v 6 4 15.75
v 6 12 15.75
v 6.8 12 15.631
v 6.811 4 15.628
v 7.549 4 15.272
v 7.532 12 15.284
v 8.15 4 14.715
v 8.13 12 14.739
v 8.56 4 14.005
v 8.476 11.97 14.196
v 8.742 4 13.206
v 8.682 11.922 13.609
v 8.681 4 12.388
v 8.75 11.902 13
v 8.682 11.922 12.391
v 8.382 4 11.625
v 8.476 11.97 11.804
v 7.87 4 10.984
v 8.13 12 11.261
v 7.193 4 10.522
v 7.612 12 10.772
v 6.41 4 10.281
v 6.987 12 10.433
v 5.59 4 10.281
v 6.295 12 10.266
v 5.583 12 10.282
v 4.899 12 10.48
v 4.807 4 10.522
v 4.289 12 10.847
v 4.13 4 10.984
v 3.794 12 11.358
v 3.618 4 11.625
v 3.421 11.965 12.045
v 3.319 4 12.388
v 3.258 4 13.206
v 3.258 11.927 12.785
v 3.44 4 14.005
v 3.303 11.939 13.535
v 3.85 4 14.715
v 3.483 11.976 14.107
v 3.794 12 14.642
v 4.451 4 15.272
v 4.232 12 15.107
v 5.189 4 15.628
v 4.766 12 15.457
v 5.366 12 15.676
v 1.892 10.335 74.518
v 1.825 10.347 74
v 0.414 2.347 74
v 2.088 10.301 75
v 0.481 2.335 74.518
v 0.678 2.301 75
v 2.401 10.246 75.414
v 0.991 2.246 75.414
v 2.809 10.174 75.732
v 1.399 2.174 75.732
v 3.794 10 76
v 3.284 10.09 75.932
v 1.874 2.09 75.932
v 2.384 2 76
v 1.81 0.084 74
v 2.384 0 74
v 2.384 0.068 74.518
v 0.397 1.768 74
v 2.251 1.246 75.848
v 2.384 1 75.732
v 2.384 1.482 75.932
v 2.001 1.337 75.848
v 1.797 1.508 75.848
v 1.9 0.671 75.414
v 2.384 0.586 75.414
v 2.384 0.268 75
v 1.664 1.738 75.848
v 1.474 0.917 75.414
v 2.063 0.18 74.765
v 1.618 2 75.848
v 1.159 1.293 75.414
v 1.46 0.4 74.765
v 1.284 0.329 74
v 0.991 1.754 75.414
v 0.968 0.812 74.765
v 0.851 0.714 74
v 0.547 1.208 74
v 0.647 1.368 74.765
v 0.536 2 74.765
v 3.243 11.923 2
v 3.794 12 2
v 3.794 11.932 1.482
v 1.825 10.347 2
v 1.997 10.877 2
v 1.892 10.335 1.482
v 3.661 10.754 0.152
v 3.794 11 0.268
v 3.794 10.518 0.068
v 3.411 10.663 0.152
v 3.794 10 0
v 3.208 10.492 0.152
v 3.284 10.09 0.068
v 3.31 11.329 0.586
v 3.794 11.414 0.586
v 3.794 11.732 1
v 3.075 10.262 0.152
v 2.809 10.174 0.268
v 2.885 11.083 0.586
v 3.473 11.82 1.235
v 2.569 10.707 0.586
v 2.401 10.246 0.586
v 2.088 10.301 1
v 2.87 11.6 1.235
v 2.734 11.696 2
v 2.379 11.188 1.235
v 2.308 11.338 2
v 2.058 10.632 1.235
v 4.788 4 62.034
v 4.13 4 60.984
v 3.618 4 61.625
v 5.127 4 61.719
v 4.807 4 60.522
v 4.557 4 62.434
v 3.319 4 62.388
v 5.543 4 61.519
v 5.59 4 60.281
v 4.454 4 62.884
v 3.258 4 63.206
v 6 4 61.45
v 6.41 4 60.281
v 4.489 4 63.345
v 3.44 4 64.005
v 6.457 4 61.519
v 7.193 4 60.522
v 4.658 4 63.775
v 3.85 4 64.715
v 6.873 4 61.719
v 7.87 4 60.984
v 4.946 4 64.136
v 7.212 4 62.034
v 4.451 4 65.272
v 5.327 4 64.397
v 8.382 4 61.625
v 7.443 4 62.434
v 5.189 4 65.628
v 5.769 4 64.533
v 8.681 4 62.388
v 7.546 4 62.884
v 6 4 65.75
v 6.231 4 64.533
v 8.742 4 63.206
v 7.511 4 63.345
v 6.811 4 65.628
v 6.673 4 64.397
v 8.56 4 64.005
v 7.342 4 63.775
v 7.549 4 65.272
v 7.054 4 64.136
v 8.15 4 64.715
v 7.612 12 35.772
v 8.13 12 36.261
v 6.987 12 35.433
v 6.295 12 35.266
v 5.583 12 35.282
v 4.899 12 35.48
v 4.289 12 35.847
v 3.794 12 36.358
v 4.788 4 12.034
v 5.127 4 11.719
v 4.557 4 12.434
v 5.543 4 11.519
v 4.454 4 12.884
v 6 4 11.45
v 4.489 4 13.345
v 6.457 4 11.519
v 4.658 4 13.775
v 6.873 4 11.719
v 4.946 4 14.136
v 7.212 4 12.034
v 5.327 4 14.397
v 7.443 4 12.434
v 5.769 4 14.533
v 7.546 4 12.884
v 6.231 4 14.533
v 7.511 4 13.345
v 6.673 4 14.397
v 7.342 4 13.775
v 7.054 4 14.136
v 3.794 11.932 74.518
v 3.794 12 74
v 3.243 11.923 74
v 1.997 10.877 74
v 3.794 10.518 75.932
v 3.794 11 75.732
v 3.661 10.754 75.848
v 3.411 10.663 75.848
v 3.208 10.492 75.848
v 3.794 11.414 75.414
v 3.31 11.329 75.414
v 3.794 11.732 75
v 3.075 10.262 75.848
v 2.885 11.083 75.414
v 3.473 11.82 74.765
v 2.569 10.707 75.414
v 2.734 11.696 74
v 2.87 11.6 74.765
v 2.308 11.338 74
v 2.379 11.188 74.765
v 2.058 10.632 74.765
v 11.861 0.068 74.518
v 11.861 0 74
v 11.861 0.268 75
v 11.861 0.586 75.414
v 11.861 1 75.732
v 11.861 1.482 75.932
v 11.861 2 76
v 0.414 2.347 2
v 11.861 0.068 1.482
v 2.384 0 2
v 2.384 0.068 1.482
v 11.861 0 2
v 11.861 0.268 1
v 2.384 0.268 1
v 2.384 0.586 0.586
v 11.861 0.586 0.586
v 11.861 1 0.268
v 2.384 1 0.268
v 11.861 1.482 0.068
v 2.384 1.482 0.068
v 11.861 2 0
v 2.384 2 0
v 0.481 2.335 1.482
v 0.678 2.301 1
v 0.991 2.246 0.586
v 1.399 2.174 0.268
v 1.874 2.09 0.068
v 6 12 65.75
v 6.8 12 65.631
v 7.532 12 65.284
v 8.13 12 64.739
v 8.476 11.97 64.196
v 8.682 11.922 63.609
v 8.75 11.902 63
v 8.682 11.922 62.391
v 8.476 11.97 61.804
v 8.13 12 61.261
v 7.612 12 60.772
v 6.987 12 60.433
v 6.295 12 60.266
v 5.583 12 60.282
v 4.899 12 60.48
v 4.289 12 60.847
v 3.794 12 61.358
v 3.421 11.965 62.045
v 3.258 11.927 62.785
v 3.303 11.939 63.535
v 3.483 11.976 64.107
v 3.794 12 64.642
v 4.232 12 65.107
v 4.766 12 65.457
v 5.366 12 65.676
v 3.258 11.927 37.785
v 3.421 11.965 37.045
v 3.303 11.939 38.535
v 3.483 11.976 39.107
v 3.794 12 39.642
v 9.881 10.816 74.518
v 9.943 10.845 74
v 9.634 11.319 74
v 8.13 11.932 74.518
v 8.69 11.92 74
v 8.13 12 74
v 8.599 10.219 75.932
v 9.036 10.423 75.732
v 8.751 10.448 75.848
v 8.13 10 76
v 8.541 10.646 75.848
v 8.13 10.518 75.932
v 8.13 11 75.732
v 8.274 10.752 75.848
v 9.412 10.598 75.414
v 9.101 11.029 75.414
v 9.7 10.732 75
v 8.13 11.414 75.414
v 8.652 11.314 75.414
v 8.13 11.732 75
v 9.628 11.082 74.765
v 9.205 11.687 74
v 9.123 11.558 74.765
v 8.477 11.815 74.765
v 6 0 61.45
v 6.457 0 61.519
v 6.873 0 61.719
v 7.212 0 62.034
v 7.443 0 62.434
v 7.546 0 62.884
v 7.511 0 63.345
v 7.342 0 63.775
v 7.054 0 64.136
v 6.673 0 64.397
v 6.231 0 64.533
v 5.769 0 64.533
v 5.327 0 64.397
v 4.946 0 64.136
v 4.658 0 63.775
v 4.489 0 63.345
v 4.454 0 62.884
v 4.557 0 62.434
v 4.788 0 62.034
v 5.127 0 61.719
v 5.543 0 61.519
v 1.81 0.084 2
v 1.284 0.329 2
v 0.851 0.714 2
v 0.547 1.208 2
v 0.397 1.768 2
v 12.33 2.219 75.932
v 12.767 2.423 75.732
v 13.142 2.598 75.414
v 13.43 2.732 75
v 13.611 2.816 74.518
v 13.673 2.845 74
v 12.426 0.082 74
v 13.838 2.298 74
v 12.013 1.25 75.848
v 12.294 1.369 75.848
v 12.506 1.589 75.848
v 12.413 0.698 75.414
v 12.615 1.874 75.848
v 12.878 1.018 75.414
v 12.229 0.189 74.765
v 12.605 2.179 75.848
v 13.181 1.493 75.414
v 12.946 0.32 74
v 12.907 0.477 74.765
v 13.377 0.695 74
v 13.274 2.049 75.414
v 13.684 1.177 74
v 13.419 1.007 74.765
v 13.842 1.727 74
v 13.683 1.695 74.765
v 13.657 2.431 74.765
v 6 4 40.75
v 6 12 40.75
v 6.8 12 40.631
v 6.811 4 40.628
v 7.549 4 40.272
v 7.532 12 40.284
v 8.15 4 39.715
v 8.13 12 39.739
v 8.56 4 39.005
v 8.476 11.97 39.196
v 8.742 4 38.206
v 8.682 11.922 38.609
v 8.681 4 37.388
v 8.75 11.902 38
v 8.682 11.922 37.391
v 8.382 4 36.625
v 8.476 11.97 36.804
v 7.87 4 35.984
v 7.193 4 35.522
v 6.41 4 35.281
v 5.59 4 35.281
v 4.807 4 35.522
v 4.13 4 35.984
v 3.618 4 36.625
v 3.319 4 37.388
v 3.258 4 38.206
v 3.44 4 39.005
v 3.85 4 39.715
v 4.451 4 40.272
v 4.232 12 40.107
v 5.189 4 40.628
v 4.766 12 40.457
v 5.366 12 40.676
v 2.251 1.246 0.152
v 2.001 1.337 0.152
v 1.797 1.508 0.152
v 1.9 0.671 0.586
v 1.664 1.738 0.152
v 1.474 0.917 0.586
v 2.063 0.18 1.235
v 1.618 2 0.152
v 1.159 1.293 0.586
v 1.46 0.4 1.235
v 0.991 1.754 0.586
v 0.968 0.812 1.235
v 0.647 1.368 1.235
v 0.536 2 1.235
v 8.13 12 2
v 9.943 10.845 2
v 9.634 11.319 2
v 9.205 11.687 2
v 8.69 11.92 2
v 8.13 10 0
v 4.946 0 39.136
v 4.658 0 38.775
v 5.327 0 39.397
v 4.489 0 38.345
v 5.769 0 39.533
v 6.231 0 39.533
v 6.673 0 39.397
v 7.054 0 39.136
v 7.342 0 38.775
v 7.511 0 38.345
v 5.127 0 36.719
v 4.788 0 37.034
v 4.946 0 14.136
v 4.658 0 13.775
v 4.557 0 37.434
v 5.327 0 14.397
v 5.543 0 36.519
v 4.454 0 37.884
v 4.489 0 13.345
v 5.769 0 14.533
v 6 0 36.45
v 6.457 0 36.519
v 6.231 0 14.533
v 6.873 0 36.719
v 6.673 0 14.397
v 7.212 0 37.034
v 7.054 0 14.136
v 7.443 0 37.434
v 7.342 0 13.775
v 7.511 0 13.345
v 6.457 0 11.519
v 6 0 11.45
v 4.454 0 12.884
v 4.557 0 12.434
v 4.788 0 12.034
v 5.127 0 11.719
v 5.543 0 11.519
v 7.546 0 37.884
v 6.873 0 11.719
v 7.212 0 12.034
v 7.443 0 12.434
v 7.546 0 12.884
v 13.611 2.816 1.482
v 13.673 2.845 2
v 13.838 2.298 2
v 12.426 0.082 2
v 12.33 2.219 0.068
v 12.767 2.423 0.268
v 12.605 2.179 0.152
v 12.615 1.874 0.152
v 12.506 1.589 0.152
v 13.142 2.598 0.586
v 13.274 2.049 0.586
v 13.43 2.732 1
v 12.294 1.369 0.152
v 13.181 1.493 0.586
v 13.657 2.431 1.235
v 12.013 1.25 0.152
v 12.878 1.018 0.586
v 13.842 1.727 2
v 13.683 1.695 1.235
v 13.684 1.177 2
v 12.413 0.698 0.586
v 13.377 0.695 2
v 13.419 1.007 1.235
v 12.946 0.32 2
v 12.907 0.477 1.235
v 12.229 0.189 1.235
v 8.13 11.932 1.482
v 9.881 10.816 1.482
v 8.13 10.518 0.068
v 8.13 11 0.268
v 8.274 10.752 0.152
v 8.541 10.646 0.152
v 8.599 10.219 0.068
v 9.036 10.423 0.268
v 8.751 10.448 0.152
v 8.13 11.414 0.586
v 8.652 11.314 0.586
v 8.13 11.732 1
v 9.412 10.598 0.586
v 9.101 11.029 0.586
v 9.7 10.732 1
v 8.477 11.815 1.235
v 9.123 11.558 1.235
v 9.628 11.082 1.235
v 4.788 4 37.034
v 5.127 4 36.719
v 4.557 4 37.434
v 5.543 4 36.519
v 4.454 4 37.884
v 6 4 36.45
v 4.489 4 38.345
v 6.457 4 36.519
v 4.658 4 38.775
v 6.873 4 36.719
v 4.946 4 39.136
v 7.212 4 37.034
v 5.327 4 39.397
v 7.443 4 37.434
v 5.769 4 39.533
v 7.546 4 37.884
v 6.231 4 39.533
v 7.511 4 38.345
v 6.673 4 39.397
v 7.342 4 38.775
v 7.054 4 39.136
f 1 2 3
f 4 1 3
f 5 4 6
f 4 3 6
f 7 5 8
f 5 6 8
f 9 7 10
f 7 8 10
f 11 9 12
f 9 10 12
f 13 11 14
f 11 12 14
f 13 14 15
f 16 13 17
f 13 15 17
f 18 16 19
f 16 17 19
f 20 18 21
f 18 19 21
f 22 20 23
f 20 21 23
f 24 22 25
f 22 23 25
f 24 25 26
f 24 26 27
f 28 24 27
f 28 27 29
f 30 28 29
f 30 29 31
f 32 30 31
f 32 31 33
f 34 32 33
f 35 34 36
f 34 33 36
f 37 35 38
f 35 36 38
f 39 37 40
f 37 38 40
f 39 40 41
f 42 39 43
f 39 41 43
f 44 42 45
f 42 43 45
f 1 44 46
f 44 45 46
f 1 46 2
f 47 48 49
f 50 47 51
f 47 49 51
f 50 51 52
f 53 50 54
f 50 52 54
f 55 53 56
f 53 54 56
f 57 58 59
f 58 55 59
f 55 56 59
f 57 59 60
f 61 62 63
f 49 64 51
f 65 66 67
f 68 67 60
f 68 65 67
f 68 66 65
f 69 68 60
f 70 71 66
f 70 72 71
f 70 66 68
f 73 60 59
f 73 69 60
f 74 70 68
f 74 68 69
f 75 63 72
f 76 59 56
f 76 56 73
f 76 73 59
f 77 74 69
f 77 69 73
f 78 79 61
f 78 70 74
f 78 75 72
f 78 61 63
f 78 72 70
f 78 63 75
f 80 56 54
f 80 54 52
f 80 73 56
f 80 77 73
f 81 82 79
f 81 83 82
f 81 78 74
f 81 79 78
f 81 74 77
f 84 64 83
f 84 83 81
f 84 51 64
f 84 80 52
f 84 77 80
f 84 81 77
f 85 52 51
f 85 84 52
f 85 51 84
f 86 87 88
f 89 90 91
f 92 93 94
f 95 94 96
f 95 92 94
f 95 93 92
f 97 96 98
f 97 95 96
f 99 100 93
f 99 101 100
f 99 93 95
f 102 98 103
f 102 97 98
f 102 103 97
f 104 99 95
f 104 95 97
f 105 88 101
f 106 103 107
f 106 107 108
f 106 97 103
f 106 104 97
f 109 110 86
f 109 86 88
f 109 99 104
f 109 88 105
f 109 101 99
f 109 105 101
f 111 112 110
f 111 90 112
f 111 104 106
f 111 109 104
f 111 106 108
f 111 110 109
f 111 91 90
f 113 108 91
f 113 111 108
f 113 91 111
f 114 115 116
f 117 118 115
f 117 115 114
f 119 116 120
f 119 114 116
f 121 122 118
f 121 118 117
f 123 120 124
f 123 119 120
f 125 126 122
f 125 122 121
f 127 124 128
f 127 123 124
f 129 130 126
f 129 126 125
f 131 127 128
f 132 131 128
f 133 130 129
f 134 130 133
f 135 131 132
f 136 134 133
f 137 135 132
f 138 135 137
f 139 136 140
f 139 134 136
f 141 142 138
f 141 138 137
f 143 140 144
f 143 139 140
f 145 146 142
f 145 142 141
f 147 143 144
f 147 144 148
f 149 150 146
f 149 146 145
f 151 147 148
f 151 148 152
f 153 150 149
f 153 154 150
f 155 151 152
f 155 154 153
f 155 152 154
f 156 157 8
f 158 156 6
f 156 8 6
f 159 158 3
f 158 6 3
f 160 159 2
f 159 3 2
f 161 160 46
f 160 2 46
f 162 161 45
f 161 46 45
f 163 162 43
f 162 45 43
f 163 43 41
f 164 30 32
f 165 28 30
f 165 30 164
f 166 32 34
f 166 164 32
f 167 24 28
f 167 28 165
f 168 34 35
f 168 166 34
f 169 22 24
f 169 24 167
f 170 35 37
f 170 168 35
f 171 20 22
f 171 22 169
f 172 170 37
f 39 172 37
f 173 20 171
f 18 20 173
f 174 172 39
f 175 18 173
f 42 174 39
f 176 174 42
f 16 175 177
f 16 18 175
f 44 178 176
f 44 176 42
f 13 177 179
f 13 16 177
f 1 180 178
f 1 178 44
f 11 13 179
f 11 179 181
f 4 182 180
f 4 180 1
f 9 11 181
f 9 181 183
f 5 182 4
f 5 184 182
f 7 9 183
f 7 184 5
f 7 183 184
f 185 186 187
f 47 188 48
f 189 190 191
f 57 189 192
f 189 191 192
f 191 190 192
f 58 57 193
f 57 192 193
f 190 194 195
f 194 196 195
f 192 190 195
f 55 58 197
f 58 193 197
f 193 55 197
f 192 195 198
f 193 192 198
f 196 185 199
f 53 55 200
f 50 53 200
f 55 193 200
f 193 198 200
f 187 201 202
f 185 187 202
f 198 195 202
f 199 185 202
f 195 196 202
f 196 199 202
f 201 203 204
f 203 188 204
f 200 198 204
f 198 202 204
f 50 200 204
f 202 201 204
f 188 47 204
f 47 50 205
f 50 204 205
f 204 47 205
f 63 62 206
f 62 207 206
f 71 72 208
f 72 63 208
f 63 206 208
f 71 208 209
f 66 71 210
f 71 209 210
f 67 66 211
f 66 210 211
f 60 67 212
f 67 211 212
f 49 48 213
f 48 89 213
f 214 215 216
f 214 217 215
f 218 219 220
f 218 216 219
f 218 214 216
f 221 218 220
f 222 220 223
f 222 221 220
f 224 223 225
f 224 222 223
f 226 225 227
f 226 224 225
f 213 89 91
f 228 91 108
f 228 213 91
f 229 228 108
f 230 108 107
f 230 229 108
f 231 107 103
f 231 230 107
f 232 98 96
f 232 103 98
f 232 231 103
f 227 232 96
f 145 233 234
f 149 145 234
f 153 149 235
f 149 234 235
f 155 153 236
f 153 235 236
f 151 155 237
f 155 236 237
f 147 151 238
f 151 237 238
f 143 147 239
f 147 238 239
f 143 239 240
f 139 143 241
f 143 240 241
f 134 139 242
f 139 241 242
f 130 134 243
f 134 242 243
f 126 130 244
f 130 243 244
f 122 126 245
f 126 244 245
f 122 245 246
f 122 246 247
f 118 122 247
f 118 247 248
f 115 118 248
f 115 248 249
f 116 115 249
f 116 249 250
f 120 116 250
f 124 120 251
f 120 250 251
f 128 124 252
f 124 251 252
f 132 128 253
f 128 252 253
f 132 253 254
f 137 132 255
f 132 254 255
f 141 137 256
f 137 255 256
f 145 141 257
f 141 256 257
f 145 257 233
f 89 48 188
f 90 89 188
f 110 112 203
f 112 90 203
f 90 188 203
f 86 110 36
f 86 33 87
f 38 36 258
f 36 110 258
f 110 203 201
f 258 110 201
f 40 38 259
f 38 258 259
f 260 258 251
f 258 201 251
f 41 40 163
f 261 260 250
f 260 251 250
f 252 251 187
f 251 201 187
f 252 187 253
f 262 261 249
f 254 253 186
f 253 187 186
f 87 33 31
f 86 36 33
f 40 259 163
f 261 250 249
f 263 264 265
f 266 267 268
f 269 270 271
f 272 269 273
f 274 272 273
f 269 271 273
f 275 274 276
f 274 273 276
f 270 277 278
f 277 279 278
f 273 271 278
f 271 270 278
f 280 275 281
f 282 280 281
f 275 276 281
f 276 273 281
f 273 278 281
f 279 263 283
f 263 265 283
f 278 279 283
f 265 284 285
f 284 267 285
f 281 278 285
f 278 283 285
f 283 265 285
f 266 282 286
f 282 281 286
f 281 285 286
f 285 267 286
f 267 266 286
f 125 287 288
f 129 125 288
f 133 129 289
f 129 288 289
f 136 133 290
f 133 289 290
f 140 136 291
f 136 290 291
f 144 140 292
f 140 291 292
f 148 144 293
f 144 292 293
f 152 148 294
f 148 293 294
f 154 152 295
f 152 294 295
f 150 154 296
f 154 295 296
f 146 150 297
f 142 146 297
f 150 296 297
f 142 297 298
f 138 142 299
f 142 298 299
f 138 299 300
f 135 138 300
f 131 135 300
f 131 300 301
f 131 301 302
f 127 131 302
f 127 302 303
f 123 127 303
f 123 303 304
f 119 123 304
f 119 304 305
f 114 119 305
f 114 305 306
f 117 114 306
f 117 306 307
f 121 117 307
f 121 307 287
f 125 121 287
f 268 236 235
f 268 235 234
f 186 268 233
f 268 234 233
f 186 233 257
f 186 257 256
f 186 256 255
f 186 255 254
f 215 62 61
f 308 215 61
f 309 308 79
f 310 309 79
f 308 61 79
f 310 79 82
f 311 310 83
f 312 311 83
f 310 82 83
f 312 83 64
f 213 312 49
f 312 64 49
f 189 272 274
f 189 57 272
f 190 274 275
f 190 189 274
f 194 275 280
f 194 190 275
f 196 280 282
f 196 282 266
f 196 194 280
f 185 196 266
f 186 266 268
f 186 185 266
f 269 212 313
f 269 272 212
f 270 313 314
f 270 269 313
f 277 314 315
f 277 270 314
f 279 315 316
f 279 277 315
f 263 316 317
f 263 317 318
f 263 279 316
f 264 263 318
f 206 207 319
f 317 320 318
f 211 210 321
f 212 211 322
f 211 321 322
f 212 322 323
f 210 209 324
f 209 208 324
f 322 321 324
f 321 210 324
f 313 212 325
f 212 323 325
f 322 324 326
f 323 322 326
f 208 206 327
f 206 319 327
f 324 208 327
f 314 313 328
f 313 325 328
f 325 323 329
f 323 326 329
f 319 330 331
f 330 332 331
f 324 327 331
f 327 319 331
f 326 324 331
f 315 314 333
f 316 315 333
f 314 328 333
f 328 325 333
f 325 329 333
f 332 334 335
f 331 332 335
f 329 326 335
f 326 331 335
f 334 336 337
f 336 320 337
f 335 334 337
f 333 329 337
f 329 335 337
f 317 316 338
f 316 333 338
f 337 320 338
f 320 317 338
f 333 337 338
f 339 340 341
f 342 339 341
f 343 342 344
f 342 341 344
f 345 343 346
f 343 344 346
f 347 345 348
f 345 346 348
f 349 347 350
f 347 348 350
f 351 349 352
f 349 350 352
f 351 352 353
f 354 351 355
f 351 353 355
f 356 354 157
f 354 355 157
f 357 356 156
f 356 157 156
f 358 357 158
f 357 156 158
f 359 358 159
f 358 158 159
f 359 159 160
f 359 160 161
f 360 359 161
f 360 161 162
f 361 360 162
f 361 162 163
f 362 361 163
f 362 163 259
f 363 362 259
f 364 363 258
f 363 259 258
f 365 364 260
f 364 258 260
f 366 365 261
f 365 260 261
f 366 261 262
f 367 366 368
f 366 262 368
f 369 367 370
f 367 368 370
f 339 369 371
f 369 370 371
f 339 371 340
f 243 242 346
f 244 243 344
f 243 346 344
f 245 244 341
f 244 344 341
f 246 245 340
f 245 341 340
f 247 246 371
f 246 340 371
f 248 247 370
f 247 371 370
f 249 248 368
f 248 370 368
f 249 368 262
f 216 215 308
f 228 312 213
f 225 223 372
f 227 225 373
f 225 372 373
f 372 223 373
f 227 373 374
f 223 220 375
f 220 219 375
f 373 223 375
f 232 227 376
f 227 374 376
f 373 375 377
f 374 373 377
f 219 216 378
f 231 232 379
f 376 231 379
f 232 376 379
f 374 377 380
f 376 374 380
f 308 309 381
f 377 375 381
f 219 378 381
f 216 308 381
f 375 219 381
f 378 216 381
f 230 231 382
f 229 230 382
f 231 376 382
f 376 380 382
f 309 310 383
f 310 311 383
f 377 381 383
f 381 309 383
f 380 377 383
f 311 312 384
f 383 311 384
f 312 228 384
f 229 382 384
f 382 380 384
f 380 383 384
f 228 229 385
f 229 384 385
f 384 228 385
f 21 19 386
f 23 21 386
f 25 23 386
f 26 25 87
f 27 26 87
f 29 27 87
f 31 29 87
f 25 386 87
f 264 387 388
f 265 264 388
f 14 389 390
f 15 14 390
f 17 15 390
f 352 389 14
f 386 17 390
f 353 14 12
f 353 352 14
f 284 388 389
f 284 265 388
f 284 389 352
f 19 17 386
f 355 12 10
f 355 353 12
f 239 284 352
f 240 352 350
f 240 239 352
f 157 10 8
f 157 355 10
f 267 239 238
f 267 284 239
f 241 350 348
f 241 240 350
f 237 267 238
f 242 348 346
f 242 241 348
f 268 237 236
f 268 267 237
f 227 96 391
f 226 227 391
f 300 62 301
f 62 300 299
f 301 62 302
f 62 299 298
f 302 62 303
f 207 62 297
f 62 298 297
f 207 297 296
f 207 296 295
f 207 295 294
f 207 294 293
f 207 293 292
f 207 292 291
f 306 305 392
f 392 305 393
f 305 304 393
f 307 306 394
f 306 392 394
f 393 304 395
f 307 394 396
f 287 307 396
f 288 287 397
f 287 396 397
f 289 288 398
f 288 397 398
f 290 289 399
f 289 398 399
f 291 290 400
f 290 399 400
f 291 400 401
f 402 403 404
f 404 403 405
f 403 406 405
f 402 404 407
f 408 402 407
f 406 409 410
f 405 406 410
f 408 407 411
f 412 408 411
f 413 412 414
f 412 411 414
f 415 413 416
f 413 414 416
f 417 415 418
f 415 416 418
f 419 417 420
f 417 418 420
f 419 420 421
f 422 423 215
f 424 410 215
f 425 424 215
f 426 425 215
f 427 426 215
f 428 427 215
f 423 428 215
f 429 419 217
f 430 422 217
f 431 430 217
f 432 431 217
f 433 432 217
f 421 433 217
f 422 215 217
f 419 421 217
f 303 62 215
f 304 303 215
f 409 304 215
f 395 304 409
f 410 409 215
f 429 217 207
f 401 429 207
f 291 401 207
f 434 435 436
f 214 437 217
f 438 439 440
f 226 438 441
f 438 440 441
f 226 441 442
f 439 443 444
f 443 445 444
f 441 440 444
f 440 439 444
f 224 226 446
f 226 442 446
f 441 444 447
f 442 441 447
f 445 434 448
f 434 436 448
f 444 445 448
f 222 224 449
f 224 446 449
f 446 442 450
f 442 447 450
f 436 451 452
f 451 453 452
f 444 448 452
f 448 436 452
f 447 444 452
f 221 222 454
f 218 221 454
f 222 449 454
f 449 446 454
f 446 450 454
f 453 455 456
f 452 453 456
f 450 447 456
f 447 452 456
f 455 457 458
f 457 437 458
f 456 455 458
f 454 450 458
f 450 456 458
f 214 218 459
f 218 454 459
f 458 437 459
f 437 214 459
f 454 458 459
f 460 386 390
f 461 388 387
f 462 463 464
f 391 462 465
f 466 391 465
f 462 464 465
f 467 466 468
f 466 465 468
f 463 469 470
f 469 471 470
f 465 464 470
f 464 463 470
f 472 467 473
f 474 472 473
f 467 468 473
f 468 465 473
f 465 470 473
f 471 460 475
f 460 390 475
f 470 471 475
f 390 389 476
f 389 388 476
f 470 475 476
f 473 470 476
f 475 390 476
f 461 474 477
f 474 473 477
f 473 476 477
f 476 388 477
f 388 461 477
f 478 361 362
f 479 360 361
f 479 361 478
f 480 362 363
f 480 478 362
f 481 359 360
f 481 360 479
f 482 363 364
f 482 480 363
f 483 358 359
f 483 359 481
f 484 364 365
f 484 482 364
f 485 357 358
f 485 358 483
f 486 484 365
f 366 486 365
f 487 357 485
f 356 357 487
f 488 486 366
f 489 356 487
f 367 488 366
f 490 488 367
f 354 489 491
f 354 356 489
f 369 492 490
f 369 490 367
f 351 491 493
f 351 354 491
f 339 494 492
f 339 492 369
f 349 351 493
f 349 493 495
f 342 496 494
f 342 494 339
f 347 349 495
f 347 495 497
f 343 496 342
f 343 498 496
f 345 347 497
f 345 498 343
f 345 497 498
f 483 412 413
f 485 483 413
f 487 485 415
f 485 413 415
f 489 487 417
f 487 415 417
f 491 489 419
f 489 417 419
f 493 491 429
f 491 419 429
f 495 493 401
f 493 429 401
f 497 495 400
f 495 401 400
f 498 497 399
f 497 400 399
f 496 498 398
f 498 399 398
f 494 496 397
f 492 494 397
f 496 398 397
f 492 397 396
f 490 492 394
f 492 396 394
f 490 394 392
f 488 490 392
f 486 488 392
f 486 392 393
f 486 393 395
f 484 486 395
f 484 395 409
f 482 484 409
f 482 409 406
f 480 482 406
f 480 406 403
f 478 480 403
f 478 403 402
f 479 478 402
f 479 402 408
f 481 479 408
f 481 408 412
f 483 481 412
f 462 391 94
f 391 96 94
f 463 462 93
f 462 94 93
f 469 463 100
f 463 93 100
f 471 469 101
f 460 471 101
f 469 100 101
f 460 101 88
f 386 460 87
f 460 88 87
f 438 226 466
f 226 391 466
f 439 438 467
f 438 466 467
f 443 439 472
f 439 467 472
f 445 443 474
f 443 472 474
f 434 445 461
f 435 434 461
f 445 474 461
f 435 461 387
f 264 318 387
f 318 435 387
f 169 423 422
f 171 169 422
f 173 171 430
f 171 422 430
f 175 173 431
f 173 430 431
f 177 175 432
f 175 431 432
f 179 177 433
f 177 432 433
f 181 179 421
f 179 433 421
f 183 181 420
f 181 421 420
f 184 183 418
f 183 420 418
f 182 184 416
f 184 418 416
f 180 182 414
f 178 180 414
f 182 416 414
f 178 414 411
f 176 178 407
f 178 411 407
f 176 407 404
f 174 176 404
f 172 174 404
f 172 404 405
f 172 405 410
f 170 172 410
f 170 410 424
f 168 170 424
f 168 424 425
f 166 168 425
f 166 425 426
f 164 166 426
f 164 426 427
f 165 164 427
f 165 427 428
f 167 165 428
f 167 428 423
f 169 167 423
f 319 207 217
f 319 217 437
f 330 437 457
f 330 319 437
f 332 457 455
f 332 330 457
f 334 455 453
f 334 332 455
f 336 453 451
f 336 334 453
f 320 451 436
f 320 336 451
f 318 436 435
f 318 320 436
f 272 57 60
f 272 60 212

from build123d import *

# Parameters (mm, degrees)
EXTRUDE_1_DEPTH     = 76
SKETCH_2_R          = 1.55
CUT_EXTRUDE_1_DEPTH = 79.390050389
FILLET_1_R          = 2
SKETCH_3_R          = 2.75
CUT_EXTRUDE_2_DEPTH = 8


with BuildPart() as part:
    # 草图1 → 凸台-拉伸1 (new body)
    with BuildSketch(Plane.XY):
        Polygon((0, 0), (15, 0), (9.404308102, 12), (2.115923769, 12), align=None)
    extrude(amount=EXTRUDE_1_DEPTH)

    # 草图2 → 切除-拉伸1 (cut, through all)
    with BuildSketch(Plane.XZ):
        with Locations(Location((6, 63, 0), (0, 0, 270))):
            Circle(SKETCH_2_R)
        with Locations(Location((6, 13, 0), (0, 0, 270))):
            Circle(SKETCH_2_R)
        with Locations(Location((6, 38, 0), (0, 0, 270))):
            Circle(SKETCH_2_R)
    extrude(amount=-CUT_EXTRUDE_1_DEPTH, mode=Mode.SUBTRACT)

    # 圆角1
    fillet_1_edges = [part.edges().sort_by_distance(p)[0] for p in [
        (12.202154051, 6, 76),
        (5.760115935, 12, 76),
        (1.057961884, 6, 76),
        (5.760115935, 12, 0),
        (12.202154051, 6, 0),
        (7.5, 0, 0),
        (1.057961884, 6, 0),
        (2.115923769, 12, 38),
        (9.404308102, 12, 38),
        (15, 0, 38),
        (0, 0, 38),
        (7.5, 0, 76),
    ]]
    fillet(fillet_1_edges, radius=FILLET_1_R)

    # 草图3 → 切除-拉伸2 (cut)
    with BuildSketch(Plane(origin=(0, 12, 0), x_dir=(1, 0, 0), z_dir=(0, 1, 0))):
        with Locations(Location((6, -13, 0), (0, 0, 270))):
            Circle(SKETCH_3_R)
        with Locations(Location((6, -38, 0), (0, 0, 270))):
            Circle(SKETCH_3_R)
        with Locations(Location((6, -63, 0), (0, 0, 270))):
            Circle(SKETCH_3_R)
    extrude(amount=-CUT_EXTRUDE_2_DEPTH, mode=Mode.SUBTRACT)


solid = part.part
